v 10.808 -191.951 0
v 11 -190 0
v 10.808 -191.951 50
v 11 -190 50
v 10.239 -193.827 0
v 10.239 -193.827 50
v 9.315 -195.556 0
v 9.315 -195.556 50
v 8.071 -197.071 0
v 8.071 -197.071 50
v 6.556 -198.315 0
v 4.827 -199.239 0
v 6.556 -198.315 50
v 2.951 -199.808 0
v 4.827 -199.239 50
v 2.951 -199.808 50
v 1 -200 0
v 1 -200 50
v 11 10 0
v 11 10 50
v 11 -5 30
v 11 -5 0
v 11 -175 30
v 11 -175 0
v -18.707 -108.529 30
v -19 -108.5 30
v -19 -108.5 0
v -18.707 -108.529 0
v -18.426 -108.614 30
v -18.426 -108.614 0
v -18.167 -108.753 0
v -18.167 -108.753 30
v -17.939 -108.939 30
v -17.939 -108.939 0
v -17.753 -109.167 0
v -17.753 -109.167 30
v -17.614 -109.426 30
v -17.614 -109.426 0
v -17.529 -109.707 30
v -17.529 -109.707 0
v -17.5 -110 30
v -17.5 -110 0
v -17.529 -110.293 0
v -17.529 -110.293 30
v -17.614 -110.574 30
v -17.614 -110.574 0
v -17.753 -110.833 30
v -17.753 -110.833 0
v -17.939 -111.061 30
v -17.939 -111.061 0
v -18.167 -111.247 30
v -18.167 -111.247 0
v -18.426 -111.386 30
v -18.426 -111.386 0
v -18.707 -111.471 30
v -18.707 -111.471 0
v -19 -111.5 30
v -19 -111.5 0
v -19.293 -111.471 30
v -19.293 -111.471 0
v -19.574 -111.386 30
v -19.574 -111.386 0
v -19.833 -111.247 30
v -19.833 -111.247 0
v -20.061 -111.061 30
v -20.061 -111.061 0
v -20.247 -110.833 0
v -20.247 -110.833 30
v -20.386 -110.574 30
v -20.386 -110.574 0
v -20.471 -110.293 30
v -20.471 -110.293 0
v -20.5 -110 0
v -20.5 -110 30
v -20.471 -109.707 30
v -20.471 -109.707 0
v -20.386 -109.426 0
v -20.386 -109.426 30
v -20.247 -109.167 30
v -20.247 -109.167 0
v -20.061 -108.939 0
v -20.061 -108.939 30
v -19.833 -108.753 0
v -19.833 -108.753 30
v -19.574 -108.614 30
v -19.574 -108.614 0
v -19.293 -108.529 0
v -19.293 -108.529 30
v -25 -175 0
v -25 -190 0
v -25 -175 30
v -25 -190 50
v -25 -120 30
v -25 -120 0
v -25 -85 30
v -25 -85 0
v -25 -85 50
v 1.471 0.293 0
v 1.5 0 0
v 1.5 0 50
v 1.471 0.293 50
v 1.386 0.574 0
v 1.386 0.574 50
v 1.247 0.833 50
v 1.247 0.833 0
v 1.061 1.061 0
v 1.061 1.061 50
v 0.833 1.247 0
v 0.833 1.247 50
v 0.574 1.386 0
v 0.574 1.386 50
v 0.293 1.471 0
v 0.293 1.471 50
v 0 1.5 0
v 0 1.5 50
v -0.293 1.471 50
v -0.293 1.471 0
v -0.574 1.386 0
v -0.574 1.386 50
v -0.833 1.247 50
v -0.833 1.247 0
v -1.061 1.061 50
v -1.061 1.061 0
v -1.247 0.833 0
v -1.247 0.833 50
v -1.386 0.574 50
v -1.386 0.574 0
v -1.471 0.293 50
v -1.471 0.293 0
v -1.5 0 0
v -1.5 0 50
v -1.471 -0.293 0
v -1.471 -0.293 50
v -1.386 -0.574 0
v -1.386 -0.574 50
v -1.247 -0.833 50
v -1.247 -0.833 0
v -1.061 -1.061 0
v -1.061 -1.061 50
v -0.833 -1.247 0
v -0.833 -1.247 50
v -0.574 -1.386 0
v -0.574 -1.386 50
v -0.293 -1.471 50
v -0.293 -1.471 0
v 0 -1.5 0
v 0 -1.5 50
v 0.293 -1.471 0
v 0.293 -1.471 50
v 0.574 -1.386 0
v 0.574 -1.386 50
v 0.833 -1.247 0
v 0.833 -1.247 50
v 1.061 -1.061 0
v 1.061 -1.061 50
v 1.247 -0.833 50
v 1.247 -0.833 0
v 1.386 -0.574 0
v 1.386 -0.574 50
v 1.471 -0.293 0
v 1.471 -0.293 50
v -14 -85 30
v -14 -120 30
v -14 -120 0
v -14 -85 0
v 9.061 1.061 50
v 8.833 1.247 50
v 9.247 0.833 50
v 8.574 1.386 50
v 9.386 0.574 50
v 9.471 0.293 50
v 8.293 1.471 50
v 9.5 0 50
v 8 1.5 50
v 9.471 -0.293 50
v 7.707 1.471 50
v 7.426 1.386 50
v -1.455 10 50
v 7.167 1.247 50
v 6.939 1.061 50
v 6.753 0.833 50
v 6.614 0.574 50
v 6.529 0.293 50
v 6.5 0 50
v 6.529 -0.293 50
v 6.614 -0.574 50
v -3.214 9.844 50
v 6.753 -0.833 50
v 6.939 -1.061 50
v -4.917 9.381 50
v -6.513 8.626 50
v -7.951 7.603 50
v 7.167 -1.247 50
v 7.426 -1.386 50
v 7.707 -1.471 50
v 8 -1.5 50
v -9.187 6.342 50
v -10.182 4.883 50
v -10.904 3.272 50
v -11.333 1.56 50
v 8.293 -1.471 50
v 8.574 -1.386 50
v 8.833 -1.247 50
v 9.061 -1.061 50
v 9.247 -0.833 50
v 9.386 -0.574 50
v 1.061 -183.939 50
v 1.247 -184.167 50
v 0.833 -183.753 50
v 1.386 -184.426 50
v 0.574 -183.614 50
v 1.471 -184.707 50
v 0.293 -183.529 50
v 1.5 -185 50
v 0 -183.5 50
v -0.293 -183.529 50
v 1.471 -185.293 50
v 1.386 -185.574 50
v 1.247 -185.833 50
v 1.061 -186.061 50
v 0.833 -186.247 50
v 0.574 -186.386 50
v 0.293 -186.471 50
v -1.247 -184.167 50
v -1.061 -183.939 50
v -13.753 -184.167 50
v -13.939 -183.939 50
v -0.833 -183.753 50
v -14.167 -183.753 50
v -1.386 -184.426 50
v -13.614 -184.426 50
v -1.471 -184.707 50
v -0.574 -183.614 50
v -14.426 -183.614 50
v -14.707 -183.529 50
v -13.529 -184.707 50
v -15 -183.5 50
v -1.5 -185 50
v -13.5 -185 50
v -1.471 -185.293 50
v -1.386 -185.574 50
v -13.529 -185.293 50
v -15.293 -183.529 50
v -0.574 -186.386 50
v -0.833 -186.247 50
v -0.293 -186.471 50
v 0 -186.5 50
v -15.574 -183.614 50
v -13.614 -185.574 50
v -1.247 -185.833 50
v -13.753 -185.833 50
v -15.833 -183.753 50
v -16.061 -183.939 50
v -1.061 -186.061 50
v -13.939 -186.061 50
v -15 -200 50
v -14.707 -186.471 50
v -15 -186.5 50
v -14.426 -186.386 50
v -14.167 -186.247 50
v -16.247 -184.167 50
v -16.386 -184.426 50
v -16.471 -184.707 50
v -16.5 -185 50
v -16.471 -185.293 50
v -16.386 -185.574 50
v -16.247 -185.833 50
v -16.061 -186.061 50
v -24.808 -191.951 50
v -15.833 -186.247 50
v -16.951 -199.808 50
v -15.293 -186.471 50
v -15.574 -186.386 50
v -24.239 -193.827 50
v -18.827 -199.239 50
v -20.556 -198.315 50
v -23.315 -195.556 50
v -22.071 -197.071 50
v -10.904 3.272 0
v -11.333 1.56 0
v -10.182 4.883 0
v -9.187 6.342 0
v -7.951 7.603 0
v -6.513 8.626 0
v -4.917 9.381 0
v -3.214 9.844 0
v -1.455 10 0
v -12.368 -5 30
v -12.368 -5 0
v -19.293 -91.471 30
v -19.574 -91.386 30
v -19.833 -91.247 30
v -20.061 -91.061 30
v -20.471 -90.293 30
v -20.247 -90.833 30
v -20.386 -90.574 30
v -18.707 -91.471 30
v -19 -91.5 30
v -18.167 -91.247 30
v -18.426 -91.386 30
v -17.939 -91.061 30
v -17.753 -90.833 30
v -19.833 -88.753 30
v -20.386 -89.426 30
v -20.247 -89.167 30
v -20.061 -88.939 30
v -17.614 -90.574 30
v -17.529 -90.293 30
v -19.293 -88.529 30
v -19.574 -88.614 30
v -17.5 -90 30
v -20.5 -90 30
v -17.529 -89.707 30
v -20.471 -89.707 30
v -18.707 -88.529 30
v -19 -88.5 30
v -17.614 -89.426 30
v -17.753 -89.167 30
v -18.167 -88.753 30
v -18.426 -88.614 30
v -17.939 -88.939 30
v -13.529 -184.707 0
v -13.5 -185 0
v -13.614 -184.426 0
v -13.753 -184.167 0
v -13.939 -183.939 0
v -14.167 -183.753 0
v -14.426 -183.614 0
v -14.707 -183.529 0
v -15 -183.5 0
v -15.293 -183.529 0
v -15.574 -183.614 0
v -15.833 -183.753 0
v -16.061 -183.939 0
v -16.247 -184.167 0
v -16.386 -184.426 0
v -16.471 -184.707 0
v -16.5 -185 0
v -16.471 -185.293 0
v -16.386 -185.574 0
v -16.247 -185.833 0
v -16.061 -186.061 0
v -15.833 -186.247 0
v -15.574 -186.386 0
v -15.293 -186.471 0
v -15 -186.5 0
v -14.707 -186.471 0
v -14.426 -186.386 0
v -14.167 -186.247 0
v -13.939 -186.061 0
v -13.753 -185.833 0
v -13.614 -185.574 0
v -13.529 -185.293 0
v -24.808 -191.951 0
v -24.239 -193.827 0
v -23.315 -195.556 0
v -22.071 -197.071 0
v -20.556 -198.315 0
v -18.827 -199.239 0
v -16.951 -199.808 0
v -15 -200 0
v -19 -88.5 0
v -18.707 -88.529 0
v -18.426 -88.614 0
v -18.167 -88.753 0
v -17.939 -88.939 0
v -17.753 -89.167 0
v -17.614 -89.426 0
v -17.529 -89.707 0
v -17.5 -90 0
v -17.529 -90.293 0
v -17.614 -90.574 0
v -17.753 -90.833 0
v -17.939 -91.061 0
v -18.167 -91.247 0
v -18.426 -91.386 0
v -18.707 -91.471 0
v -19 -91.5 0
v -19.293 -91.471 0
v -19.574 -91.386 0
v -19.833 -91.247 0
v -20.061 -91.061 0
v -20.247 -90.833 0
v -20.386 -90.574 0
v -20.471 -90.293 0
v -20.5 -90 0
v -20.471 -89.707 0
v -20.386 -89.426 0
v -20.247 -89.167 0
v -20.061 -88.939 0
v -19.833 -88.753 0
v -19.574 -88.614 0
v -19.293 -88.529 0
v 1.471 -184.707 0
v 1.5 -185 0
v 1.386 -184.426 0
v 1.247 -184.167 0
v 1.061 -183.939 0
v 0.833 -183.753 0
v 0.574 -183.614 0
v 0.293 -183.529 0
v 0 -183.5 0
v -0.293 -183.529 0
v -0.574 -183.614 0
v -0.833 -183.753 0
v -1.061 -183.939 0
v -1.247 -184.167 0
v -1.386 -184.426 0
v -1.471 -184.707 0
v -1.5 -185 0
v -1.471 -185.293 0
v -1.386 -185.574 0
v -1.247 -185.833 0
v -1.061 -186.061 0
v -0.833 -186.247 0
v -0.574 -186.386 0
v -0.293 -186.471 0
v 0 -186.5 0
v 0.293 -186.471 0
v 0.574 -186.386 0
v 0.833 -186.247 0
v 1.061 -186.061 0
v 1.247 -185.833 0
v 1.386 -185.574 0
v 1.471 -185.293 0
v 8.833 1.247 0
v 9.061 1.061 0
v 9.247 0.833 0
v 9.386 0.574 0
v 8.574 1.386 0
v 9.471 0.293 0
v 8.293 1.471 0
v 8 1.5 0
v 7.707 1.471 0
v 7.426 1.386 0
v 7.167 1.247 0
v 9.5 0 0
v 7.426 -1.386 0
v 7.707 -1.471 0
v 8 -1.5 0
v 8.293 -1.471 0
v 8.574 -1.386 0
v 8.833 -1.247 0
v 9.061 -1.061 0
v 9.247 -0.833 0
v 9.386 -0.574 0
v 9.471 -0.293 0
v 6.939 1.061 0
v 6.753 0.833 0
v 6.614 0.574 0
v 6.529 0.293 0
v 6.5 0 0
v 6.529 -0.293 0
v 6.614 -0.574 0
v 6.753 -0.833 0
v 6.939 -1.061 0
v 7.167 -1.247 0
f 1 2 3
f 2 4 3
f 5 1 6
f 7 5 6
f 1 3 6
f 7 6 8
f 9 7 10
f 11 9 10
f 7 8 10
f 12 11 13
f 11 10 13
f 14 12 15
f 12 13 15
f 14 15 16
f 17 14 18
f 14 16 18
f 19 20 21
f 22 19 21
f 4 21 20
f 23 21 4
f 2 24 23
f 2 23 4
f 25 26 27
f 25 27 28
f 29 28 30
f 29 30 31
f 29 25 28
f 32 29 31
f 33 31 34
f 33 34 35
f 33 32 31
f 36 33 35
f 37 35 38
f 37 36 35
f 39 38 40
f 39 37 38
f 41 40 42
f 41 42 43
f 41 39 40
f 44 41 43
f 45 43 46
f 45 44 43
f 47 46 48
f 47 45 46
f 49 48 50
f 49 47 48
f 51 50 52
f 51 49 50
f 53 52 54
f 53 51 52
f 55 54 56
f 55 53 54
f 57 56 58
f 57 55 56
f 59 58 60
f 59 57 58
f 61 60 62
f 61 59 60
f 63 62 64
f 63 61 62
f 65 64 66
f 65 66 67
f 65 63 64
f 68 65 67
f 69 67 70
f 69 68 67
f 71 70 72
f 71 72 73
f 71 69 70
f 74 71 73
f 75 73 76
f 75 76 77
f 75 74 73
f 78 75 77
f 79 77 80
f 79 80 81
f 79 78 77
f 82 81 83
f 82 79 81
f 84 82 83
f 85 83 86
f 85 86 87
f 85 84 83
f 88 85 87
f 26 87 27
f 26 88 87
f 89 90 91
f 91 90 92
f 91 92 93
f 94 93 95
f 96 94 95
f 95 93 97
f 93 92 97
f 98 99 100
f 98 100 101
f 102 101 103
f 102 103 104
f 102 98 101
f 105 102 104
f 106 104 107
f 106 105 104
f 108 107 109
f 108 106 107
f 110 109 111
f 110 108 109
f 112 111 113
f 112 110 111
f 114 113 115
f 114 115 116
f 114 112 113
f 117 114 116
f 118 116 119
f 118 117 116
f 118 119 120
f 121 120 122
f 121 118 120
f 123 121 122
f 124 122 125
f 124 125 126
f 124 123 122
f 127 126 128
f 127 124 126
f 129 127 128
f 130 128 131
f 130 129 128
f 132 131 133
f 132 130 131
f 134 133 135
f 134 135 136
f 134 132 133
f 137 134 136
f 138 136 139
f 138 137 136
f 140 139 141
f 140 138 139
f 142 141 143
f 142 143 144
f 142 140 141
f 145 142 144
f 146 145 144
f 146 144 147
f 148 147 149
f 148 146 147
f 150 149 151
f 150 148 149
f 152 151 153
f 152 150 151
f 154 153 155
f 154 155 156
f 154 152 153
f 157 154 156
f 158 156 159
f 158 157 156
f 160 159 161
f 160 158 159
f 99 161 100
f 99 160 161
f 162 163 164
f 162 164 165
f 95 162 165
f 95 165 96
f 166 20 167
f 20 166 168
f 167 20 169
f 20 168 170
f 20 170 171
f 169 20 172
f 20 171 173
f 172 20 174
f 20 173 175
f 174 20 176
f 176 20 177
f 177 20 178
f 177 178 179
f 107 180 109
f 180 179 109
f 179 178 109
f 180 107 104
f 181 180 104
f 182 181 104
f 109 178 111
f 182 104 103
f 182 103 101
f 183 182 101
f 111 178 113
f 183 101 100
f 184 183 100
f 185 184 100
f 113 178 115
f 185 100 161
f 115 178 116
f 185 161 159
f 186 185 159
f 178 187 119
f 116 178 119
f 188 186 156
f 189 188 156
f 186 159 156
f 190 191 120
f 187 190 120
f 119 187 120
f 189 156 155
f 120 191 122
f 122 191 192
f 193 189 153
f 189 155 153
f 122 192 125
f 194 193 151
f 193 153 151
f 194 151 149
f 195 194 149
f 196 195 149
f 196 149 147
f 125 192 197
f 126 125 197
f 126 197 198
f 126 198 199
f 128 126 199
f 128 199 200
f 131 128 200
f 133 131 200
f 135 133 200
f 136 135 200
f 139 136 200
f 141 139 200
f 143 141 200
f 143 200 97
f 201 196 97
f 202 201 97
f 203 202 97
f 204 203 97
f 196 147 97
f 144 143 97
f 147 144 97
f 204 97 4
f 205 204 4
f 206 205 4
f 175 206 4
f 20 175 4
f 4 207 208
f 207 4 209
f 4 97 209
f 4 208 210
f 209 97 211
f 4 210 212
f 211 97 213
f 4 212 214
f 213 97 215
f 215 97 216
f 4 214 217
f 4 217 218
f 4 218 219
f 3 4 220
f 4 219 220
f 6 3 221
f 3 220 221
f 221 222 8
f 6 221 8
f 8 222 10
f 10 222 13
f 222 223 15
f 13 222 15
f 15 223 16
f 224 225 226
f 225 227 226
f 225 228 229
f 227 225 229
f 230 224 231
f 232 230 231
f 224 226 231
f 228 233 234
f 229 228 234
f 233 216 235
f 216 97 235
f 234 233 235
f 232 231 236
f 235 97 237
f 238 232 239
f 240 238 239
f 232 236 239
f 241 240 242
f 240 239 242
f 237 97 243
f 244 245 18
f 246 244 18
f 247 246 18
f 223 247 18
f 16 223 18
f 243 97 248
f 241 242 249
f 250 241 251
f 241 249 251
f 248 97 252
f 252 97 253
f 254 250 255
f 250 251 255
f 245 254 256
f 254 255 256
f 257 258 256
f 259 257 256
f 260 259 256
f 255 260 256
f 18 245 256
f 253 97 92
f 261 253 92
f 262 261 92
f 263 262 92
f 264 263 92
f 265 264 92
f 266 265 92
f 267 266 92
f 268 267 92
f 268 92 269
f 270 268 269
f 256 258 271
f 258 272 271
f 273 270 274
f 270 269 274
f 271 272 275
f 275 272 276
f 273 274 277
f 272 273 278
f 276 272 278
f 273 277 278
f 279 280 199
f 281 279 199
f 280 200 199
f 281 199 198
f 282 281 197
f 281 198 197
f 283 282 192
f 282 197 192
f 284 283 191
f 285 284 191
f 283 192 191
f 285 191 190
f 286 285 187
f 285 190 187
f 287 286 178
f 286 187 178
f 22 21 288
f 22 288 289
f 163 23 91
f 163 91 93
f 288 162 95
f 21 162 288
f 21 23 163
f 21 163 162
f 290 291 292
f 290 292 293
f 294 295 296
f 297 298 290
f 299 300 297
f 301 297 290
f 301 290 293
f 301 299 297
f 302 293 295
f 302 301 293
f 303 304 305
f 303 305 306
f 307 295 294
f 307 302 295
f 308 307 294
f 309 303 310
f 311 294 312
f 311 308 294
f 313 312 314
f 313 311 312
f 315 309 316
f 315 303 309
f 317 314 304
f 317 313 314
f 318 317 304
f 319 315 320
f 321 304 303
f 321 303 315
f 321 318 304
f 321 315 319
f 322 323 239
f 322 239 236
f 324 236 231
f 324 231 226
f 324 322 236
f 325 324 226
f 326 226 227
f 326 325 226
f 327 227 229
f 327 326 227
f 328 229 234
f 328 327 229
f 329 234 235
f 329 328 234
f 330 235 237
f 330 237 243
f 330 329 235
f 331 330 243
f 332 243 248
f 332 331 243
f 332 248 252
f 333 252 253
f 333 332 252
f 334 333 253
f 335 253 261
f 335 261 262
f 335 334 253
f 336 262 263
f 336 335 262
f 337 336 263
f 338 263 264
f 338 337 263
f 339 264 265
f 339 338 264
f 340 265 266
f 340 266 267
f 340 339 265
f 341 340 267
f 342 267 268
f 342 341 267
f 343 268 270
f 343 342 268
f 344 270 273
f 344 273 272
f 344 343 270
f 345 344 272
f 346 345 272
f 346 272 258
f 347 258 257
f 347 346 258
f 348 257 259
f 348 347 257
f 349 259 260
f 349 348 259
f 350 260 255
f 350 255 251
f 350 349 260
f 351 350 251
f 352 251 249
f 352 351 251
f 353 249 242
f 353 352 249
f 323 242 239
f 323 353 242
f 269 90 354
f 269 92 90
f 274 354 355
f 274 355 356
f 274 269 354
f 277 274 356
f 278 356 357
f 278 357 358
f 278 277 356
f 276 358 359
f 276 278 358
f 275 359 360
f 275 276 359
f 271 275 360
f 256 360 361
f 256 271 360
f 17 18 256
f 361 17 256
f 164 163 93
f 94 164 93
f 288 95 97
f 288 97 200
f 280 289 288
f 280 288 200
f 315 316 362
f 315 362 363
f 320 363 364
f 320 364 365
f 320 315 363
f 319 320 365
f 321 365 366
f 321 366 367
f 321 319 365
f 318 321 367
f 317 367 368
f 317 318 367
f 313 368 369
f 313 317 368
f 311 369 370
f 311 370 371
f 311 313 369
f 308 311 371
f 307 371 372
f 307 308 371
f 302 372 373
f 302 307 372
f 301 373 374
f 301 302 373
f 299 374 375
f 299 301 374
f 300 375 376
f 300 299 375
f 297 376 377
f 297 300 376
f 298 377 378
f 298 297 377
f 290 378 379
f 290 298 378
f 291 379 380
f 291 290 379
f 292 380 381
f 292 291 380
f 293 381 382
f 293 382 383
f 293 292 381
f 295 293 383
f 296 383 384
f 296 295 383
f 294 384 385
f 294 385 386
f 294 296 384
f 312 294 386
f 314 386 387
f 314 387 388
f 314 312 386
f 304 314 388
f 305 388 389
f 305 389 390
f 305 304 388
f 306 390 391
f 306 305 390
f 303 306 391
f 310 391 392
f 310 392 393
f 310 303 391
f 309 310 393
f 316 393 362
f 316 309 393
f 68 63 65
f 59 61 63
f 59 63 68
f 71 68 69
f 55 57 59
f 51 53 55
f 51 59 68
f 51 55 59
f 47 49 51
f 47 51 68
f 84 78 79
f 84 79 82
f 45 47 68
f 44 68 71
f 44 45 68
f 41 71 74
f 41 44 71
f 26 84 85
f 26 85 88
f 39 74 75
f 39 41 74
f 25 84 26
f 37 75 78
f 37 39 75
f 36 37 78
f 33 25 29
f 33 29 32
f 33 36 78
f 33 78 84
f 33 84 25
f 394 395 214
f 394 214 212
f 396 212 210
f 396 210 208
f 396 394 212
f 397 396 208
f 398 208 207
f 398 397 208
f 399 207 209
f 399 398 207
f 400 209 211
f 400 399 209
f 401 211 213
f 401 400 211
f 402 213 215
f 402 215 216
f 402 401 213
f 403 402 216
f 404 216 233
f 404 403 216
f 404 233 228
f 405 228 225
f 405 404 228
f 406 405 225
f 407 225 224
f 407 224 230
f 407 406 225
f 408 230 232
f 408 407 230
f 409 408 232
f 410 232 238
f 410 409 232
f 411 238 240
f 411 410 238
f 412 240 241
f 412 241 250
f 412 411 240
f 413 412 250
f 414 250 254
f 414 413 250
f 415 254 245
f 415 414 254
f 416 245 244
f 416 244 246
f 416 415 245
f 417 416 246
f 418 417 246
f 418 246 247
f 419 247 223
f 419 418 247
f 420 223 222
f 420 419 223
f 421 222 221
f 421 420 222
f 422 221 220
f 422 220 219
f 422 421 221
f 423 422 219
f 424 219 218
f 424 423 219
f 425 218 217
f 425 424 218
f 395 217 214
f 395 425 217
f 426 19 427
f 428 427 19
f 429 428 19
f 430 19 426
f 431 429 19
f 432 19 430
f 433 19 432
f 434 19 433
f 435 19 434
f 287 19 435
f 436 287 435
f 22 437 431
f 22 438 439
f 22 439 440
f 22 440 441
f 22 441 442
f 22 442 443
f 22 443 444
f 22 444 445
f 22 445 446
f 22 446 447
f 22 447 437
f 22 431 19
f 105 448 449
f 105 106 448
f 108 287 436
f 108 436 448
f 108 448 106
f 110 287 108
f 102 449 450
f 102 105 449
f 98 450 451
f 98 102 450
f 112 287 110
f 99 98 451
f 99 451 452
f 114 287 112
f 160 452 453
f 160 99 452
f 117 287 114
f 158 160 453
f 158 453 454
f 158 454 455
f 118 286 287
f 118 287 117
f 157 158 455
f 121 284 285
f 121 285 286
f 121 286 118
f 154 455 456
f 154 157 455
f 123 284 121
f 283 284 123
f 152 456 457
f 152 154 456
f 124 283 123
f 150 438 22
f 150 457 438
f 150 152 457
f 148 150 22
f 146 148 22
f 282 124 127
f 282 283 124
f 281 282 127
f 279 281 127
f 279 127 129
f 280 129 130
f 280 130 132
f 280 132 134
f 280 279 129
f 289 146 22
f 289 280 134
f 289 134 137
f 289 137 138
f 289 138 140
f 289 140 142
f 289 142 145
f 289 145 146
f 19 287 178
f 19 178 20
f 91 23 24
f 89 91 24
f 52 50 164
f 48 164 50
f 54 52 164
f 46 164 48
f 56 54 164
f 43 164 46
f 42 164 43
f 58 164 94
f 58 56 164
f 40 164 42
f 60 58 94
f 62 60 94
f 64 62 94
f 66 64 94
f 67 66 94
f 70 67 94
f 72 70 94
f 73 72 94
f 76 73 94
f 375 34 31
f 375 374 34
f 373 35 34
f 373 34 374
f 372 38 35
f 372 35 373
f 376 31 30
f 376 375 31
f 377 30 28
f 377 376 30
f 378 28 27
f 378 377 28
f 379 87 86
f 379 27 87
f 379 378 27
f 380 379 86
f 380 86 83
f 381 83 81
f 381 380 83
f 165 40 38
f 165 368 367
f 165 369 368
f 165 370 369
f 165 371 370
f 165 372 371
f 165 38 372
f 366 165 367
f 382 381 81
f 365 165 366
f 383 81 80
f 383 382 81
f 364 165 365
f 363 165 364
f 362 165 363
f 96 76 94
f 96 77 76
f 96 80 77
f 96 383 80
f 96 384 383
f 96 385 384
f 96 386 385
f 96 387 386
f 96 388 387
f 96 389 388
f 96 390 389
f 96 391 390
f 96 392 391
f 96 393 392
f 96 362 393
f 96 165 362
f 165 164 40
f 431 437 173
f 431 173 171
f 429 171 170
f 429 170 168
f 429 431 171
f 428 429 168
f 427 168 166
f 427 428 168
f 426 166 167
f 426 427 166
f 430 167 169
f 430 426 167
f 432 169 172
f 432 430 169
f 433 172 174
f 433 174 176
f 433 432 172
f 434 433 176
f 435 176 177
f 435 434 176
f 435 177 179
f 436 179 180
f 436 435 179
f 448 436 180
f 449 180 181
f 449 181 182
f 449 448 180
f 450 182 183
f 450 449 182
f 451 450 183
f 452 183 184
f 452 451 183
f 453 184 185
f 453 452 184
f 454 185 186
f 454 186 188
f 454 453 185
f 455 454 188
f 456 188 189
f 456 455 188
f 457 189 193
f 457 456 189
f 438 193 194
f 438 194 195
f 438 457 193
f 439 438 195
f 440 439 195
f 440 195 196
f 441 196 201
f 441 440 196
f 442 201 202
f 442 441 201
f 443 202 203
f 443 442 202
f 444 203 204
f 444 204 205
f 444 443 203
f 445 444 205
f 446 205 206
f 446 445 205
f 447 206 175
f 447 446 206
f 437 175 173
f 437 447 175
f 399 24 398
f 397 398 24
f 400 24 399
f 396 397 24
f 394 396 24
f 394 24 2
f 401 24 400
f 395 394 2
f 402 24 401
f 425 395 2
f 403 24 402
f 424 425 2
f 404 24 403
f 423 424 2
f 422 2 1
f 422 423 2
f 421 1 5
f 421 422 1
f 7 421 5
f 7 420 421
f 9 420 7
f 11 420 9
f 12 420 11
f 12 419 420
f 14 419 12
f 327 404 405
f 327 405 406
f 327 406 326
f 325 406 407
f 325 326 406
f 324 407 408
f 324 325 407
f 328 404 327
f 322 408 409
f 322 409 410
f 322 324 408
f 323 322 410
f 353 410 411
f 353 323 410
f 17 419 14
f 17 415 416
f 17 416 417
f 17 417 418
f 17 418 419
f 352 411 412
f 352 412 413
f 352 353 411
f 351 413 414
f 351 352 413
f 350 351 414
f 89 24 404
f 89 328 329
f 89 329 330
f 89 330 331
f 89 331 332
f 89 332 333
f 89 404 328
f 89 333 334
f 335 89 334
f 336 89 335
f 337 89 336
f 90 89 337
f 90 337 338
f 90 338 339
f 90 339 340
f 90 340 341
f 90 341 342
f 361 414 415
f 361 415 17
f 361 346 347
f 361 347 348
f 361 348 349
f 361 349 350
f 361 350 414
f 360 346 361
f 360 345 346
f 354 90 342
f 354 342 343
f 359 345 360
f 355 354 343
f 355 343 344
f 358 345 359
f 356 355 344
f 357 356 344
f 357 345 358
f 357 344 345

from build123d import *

# Parameters (mm, degrees)
CROQUIS1_R              = 1.5
SALIENTE_EXTRUIR1_DEPTH = 50
CORTAR_EXTRUIR1_REACH   = 211.275
CROQUIS2_W              = 30
CROQUIS2_H              = 170
REDONDEO1_R             = 10
REDONDEO2_R             = 10
CROQUIS3_W              = 11
CROQUIS3_H              = 35
CROQUIS3_R              = 1.5
SALIENTE_EXTRUIR2_DEPTH = 30


with BuildPart() as part:
    # Croquis1 → Saliente-Extruir1 (new body)
    with BuildSketch(Plane(origin=(0, 0, 0), x_dir=(0, 1, 0), z_dir=(0, 0, 1))):
        Polygon((-85, 25), (10, 10), (10, -11), (-200, -11), (-200, 25), align=None)
        with Locations(Location((0, 0, 0), (0, 0, 270))):
            Circle(CROQUIS1_R, mode=Mode.SUBTRACT)
        with Locations(Location((-185, 0, 0), (0, 0, 270))):
            Circle(CROQUIS1_R, mode=Mode.SUBTRACT)
        with Locations(Location((-185, 15, 0), (0, 0, 270))):
            Circle(CROQUIS1_R, mode=Mode.SUBTRACT)
        with Locations(Location((0, -8, 0), (0, 0, 270))):
            Circle(CROQUIS1_R, mode=Mode.SUBTRACT)
    extrude(amount=SALIENTE_EXTRUIR1_DEPTH)

    # Croquis2 → Cortar-Extruir1 (cut, up to next)
    with BuildSketch(Plane(origin=(11, 0, 0), x_dir=(0, 0, -1), z_dir=(1, 0, 0)), mode=Mode.PRIVATE) as cortar_extruir1_sk1:
        with Locations((-15, -90)):
            Rectangle(CROQUIS2_W, CROQUIS2_H)
    cortar_extruir1_tool1 = extrude(cortar_extruir1_sk1.sketch, amount=-CORTAR_EXTRUIR1_REACH, mode=Mode.PRIVATE) & part.part
    add(cortar_extruir1_tool1.solids().sort_by_distance((11, -90, 15))[0], mode=Mode.SUBTRACT)

    # Redondeo1
    redondeo1_edges = [part.edges().sort_by_distance(p)[0] for p in [
        (11, -200, 25),
        (-25, -200, 25),
    ]]
    fillet(redondeo1_edges, radius=REDONDEO1_R)

    # Redondeo2
    redondeo2_edges = [part.edges().sort_by_distance(p)[0] for p in [
        (-10, 10, 25),
    ]]
    fillet(redondeo2_edges, radius=REDONDEO2_R)

    # Croquis3 → Saliente-Extruir2 (add)
    with BuildSketch(Plane(origin=(0, 0, 30), x_dir=(-1, 0, 0), z_dir=(0, 0, -1))):
        with Locations((19.5, -102.5)):
            Rectangle(CROQUIS3_W, CROQUIS3_H)
        with Locations(Location((19, -90, 0), (0, 0, 90))):
            Circle(CROQUIS3_R, mode=Mode.SUBTRACT)
        with Locations(Location((19, -110, 0), (0, 0, 90))):
            Circle(CROQUIS3_R, mode=Mode.SUBTRACT)
    extrude(amount=SALIENTE_EXTRUIR2_DEPTH)


solid = part.part
